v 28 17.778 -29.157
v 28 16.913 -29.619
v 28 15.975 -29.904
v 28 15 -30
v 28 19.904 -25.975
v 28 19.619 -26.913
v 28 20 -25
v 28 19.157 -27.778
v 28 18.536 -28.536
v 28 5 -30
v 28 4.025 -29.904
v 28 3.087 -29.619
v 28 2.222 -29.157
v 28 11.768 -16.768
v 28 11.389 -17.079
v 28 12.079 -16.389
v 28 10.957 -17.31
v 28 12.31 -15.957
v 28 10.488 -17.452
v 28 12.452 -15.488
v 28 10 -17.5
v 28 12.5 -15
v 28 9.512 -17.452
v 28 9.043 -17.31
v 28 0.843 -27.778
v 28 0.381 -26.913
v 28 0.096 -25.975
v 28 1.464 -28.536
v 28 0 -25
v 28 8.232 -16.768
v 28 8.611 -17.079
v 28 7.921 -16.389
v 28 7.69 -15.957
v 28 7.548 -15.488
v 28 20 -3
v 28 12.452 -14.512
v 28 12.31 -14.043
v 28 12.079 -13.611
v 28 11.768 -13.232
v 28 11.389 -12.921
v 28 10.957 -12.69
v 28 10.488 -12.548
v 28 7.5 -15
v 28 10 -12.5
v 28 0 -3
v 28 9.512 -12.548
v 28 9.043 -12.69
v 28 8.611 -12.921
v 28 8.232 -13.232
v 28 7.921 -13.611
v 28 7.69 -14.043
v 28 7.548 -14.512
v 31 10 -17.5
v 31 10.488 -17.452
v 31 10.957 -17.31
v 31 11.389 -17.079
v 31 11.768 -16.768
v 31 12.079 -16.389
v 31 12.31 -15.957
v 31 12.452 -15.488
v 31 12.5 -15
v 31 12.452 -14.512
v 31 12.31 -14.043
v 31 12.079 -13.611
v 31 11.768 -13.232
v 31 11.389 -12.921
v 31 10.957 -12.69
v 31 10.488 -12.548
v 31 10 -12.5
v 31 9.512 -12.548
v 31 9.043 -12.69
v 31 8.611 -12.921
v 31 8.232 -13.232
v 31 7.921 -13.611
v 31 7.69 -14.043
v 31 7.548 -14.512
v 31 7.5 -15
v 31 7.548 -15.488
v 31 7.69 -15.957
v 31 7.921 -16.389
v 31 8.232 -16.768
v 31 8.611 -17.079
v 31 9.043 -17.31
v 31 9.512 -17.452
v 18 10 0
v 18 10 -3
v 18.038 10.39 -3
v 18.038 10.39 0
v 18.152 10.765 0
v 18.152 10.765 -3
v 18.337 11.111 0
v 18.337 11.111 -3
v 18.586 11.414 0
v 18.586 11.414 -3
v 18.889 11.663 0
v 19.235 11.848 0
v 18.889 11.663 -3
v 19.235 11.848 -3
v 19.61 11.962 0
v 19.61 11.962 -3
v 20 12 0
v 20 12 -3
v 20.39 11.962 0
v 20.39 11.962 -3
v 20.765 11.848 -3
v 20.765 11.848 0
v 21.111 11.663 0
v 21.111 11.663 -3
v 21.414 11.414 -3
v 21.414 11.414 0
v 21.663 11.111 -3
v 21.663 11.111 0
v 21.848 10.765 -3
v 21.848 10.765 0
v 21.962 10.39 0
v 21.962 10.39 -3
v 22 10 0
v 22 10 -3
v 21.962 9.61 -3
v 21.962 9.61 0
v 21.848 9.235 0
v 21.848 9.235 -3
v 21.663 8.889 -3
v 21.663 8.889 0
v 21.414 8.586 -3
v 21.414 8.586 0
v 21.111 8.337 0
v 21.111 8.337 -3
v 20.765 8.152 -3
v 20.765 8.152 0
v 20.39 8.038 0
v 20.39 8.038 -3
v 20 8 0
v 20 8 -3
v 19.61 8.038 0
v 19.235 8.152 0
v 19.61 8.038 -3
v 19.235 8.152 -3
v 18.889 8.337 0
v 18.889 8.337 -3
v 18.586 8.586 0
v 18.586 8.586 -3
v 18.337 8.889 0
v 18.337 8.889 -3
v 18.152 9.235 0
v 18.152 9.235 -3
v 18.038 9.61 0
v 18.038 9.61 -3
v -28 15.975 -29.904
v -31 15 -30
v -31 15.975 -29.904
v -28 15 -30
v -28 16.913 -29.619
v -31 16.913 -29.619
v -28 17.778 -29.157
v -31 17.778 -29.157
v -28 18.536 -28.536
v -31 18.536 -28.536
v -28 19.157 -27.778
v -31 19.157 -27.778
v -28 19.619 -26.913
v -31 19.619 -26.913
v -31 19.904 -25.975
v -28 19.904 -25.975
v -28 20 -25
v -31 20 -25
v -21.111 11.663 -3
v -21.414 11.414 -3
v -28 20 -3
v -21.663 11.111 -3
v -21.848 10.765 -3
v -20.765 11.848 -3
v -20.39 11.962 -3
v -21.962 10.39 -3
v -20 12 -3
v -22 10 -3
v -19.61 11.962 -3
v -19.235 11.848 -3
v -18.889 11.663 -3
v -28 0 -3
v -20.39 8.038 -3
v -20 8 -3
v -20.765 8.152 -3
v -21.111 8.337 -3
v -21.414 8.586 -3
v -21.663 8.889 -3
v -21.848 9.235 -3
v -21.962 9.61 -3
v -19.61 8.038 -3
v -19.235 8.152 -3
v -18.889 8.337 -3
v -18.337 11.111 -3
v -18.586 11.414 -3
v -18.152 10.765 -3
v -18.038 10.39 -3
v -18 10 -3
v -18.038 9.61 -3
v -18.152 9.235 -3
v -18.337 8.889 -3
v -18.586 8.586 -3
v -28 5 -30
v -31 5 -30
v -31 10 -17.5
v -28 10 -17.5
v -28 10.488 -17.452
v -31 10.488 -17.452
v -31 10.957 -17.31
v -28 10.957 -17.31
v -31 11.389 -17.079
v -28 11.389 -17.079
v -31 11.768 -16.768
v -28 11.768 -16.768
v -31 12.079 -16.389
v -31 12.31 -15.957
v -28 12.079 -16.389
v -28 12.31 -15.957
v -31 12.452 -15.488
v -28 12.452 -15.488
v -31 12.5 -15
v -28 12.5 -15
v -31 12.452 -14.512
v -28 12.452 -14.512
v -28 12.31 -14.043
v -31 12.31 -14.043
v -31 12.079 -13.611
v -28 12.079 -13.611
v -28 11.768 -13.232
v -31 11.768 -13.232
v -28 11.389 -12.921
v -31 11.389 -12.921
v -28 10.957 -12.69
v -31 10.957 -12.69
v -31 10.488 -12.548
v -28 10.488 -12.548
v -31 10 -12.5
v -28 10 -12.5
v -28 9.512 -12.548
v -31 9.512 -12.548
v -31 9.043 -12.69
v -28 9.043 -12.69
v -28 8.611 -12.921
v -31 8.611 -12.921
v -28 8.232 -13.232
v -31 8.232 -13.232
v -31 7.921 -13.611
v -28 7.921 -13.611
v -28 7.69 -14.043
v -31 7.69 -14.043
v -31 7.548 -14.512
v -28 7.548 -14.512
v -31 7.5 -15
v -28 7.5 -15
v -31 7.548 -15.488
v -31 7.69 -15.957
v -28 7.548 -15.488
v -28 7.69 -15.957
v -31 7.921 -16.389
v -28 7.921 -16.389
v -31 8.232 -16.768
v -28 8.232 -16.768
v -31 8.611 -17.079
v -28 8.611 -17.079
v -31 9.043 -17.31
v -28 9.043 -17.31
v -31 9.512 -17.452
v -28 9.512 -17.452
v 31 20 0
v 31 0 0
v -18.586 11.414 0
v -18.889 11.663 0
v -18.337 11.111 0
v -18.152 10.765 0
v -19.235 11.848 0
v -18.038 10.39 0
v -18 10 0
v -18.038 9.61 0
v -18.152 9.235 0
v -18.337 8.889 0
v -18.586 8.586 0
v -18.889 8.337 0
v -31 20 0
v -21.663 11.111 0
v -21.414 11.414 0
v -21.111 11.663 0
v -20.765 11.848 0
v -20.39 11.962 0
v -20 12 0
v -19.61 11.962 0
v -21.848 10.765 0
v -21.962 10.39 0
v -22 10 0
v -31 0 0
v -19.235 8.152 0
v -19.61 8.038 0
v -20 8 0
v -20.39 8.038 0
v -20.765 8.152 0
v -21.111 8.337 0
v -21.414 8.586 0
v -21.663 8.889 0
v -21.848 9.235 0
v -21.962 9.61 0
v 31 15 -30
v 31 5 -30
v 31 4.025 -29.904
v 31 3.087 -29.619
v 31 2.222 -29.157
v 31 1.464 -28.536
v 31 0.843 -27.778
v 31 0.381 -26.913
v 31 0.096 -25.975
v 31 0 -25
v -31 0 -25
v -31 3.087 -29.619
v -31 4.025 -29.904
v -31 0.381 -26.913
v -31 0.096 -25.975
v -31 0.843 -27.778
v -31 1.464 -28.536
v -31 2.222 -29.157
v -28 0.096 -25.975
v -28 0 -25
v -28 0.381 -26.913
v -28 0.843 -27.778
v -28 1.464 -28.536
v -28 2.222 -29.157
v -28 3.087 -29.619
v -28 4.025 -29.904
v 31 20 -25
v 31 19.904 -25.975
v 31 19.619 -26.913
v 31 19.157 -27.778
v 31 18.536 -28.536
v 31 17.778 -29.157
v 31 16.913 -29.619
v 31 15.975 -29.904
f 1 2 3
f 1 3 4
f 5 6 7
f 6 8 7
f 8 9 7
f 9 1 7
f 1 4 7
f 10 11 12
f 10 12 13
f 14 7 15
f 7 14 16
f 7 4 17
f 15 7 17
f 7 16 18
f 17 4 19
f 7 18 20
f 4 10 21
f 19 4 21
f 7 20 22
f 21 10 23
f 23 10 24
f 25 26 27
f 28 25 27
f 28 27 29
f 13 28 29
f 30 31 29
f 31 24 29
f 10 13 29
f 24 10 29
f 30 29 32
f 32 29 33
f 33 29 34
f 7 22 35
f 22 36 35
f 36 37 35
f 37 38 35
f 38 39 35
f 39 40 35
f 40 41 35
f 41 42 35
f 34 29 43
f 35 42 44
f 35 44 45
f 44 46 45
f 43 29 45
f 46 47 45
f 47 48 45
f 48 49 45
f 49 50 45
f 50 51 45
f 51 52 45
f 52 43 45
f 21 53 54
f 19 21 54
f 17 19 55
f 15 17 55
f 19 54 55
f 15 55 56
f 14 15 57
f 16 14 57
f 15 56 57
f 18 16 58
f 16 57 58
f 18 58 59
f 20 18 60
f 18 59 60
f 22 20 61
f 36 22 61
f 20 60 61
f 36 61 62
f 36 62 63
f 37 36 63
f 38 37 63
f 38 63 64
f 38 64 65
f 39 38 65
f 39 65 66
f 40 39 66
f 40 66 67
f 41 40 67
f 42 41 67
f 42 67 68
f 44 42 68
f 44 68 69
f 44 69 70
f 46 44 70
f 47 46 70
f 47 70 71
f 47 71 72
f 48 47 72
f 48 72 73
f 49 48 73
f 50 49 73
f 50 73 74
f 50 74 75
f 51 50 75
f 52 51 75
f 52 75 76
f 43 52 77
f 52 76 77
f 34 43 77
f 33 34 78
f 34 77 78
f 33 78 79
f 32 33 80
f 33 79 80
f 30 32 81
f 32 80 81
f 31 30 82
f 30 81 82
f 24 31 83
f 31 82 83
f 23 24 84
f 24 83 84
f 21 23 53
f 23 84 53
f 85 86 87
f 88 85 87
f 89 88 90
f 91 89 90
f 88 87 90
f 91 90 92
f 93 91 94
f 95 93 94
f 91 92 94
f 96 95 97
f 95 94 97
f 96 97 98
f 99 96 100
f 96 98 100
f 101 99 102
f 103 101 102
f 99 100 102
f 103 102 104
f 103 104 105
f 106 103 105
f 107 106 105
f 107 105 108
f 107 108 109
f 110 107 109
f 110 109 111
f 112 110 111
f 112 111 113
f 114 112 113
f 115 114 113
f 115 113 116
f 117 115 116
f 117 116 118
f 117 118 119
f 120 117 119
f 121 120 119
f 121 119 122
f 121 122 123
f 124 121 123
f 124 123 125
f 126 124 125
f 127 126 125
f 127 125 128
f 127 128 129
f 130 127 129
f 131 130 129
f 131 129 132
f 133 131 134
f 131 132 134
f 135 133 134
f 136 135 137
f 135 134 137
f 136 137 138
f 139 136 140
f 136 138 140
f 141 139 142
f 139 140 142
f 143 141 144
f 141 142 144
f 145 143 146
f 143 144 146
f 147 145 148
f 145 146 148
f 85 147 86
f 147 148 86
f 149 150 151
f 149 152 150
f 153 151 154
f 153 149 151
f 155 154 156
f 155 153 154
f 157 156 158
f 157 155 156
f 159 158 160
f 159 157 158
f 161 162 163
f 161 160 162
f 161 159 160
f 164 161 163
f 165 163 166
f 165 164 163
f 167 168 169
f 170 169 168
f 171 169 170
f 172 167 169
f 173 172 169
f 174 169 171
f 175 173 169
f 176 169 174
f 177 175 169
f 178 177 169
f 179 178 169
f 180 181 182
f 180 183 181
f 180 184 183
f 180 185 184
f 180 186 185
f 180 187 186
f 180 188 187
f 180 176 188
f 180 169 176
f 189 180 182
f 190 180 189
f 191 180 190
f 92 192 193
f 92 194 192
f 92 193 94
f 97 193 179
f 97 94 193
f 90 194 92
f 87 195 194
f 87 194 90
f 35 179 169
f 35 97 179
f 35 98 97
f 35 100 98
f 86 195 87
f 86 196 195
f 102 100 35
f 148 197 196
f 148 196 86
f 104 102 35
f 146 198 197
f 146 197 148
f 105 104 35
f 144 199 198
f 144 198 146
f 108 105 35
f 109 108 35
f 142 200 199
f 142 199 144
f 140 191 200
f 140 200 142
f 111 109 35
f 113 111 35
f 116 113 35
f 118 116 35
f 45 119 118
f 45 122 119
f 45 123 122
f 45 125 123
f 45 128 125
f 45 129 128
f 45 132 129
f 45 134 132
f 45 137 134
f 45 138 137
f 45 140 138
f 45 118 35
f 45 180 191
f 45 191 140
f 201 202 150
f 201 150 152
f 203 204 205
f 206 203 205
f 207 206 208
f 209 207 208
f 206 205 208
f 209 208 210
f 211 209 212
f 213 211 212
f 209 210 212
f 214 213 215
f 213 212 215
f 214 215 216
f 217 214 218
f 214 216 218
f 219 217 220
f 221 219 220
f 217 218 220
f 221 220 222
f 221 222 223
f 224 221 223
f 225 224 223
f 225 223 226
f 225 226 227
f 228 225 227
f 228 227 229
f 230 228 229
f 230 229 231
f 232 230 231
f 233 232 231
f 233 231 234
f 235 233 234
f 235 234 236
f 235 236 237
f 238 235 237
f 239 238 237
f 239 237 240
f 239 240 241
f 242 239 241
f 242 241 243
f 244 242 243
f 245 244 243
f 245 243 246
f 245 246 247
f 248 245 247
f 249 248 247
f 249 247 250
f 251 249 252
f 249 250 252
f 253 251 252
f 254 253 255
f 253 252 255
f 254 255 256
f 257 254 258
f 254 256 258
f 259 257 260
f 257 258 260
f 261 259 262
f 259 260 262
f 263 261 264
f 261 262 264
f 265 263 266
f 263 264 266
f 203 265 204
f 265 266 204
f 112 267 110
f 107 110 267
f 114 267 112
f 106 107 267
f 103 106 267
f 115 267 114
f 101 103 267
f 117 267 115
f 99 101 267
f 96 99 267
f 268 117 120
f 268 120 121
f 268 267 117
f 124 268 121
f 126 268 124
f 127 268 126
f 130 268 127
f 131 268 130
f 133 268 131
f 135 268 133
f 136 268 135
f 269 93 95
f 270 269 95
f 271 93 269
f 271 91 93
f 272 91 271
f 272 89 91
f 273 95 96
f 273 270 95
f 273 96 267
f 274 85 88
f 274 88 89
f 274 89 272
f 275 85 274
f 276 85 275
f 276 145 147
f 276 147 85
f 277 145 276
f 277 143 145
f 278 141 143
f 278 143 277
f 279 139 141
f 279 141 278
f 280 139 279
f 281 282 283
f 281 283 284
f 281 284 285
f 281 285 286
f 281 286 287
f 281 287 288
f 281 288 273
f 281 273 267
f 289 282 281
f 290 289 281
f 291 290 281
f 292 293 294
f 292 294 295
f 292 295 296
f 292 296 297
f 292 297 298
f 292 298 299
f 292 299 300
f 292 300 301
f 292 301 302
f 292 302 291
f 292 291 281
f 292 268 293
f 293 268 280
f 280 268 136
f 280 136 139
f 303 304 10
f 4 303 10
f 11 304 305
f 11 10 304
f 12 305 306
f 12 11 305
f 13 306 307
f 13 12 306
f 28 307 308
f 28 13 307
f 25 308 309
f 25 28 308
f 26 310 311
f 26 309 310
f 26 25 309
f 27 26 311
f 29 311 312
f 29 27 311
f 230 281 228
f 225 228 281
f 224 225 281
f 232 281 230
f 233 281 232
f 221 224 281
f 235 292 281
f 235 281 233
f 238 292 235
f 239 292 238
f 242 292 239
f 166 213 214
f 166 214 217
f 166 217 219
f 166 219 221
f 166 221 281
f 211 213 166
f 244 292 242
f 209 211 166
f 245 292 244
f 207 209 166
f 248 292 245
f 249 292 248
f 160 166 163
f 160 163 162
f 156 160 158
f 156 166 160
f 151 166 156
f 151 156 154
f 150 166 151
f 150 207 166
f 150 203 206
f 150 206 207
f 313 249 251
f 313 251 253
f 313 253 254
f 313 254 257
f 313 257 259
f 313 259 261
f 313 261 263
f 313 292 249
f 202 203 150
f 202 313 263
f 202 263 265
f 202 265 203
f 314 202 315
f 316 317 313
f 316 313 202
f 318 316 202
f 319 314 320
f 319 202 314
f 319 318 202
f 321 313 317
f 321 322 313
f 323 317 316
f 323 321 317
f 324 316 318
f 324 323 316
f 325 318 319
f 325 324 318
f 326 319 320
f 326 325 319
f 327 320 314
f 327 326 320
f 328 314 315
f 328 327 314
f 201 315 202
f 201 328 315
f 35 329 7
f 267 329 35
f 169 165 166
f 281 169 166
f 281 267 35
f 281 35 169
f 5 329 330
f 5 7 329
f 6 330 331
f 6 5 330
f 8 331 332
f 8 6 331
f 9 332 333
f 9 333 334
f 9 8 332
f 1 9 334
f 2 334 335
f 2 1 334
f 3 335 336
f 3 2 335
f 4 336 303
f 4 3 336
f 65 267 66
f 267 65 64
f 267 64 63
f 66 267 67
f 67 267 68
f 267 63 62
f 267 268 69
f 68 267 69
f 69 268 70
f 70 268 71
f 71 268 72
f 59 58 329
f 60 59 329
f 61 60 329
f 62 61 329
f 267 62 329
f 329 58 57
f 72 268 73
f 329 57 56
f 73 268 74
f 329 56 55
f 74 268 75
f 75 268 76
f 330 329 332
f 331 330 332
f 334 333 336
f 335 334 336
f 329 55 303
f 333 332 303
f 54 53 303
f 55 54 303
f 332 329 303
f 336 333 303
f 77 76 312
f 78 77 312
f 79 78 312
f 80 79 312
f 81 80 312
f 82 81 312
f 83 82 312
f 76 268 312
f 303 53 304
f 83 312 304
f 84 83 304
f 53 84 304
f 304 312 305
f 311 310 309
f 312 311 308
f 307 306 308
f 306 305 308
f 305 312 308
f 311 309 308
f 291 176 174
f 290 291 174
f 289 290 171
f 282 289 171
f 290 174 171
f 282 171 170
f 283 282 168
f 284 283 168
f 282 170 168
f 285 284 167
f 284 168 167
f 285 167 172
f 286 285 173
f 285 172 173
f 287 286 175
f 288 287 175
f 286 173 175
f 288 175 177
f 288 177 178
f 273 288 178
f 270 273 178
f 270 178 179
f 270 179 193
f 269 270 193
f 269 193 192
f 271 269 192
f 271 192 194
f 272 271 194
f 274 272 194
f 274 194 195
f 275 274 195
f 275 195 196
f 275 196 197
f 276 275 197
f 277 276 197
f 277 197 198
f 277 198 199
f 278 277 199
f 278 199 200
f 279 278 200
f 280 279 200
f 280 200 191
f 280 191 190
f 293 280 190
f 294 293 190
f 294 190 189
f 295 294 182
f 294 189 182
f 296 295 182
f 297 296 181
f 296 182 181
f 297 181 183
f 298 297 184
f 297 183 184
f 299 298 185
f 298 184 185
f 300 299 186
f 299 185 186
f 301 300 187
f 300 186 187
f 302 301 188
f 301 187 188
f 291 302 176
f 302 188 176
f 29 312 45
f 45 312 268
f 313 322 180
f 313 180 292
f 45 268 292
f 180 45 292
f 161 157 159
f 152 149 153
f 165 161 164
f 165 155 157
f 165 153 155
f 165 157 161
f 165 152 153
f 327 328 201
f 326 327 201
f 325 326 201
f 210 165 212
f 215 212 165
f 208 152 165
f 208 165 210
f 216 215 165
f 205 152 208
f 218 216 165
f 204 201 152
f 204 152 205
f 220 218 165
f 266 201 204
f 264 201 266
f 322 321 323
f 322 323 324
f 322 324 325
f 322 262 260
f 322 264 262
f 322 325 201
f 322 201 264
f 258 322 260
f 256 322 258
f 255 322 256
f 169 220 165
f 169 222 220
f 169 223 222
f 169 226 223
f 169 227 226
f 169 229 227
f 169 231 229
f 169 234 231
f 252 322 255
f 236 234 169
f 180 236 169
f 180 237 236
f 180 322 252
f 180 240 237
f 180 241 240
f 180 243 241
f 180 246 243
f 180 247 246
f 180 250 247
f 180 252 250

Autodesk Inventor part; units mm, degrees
ref_plane "YZ Plane" through (0, 0, 0) normal (1, 0, 0) x (0, 1, 0)
ref_plane "XZ Plane" through (0, 0, 0) normal (0, 1, 0) x (-1, 0, 0)
ref_plane "XY Plane" through (0, 0, 0) normal (0, 0, 1) x (1, 0, 0)
sketch "Sketch1" plane through (0, 0, 0) normal (0, 1, 0) x (-1, 0, 0)
  line L0 (0, 0) -> (31, 0)
  line L1 (31, 0) -> (31, -30)
  line L2 (31, -30) -> (28, -30)
  line L3 (28, -30) -> (28, -3)
  line L4 (28, -3) -> (0, -3)
  line L5 (0, -3) -> (0, 0) construction
  line L6 (0, 0) -> (-31, 0)
  line L7 (-31, 0) -> (-31, -30)
  line L8 (-31, -30) -> (-28, -30)
  line L9 (-28, -30) -> (-28, -3)
  line L10 (-28, -3) -> (0, -3)
  dimension "d0" = 31
  dimension "d1" = 30
  dimension "d2" = 3
  dimension "d3" = 27
extrude "Extrusion1" add sketch "Sketch1" along normal blind 20
sketch "Sketch2" plane through (31, 0, 0) normal (1, 0, 0) x (0, 0, -1)
  line L0 (30, 0) -> (0, 0) construction
  line L1 (0, 0) -> (15, 0) construction
  line L2 (15, 0) -> (15, 10) construction
  circle A0 centre (15, 10) radius 2.5
  dimension "d6" = 15
  dimension "d7" = 10
  dimension "d8" = 5
extrude "Extrusion2" cut sketch "Sketch2" against normal blind 70
fillet "Fillet1" radius 5 4 edges at (29.5, 20, -30) (29.5, 0, -30) (-29.5, 0, -30) (-29.5, 20, -30)
sketch "Sketch3" plane through (28, 0, -3) normal (0, 0, -1) x (-1, 0, 0)
  line L0 (28, 0) -> (28, 10) construction
  line L1 (28, 10) -> (48, 10) construction
  circle A0 centre (48, 10) radius 2
  circle A1 centre (8, 10) radius 2
  dimension "d12" = 10
  dimension "d13" = 20
  dimension "d14" = 4
extrude "Extrusion3" cut sketch "Sketch3" against normal blind 10
properties part number "Aligner"
